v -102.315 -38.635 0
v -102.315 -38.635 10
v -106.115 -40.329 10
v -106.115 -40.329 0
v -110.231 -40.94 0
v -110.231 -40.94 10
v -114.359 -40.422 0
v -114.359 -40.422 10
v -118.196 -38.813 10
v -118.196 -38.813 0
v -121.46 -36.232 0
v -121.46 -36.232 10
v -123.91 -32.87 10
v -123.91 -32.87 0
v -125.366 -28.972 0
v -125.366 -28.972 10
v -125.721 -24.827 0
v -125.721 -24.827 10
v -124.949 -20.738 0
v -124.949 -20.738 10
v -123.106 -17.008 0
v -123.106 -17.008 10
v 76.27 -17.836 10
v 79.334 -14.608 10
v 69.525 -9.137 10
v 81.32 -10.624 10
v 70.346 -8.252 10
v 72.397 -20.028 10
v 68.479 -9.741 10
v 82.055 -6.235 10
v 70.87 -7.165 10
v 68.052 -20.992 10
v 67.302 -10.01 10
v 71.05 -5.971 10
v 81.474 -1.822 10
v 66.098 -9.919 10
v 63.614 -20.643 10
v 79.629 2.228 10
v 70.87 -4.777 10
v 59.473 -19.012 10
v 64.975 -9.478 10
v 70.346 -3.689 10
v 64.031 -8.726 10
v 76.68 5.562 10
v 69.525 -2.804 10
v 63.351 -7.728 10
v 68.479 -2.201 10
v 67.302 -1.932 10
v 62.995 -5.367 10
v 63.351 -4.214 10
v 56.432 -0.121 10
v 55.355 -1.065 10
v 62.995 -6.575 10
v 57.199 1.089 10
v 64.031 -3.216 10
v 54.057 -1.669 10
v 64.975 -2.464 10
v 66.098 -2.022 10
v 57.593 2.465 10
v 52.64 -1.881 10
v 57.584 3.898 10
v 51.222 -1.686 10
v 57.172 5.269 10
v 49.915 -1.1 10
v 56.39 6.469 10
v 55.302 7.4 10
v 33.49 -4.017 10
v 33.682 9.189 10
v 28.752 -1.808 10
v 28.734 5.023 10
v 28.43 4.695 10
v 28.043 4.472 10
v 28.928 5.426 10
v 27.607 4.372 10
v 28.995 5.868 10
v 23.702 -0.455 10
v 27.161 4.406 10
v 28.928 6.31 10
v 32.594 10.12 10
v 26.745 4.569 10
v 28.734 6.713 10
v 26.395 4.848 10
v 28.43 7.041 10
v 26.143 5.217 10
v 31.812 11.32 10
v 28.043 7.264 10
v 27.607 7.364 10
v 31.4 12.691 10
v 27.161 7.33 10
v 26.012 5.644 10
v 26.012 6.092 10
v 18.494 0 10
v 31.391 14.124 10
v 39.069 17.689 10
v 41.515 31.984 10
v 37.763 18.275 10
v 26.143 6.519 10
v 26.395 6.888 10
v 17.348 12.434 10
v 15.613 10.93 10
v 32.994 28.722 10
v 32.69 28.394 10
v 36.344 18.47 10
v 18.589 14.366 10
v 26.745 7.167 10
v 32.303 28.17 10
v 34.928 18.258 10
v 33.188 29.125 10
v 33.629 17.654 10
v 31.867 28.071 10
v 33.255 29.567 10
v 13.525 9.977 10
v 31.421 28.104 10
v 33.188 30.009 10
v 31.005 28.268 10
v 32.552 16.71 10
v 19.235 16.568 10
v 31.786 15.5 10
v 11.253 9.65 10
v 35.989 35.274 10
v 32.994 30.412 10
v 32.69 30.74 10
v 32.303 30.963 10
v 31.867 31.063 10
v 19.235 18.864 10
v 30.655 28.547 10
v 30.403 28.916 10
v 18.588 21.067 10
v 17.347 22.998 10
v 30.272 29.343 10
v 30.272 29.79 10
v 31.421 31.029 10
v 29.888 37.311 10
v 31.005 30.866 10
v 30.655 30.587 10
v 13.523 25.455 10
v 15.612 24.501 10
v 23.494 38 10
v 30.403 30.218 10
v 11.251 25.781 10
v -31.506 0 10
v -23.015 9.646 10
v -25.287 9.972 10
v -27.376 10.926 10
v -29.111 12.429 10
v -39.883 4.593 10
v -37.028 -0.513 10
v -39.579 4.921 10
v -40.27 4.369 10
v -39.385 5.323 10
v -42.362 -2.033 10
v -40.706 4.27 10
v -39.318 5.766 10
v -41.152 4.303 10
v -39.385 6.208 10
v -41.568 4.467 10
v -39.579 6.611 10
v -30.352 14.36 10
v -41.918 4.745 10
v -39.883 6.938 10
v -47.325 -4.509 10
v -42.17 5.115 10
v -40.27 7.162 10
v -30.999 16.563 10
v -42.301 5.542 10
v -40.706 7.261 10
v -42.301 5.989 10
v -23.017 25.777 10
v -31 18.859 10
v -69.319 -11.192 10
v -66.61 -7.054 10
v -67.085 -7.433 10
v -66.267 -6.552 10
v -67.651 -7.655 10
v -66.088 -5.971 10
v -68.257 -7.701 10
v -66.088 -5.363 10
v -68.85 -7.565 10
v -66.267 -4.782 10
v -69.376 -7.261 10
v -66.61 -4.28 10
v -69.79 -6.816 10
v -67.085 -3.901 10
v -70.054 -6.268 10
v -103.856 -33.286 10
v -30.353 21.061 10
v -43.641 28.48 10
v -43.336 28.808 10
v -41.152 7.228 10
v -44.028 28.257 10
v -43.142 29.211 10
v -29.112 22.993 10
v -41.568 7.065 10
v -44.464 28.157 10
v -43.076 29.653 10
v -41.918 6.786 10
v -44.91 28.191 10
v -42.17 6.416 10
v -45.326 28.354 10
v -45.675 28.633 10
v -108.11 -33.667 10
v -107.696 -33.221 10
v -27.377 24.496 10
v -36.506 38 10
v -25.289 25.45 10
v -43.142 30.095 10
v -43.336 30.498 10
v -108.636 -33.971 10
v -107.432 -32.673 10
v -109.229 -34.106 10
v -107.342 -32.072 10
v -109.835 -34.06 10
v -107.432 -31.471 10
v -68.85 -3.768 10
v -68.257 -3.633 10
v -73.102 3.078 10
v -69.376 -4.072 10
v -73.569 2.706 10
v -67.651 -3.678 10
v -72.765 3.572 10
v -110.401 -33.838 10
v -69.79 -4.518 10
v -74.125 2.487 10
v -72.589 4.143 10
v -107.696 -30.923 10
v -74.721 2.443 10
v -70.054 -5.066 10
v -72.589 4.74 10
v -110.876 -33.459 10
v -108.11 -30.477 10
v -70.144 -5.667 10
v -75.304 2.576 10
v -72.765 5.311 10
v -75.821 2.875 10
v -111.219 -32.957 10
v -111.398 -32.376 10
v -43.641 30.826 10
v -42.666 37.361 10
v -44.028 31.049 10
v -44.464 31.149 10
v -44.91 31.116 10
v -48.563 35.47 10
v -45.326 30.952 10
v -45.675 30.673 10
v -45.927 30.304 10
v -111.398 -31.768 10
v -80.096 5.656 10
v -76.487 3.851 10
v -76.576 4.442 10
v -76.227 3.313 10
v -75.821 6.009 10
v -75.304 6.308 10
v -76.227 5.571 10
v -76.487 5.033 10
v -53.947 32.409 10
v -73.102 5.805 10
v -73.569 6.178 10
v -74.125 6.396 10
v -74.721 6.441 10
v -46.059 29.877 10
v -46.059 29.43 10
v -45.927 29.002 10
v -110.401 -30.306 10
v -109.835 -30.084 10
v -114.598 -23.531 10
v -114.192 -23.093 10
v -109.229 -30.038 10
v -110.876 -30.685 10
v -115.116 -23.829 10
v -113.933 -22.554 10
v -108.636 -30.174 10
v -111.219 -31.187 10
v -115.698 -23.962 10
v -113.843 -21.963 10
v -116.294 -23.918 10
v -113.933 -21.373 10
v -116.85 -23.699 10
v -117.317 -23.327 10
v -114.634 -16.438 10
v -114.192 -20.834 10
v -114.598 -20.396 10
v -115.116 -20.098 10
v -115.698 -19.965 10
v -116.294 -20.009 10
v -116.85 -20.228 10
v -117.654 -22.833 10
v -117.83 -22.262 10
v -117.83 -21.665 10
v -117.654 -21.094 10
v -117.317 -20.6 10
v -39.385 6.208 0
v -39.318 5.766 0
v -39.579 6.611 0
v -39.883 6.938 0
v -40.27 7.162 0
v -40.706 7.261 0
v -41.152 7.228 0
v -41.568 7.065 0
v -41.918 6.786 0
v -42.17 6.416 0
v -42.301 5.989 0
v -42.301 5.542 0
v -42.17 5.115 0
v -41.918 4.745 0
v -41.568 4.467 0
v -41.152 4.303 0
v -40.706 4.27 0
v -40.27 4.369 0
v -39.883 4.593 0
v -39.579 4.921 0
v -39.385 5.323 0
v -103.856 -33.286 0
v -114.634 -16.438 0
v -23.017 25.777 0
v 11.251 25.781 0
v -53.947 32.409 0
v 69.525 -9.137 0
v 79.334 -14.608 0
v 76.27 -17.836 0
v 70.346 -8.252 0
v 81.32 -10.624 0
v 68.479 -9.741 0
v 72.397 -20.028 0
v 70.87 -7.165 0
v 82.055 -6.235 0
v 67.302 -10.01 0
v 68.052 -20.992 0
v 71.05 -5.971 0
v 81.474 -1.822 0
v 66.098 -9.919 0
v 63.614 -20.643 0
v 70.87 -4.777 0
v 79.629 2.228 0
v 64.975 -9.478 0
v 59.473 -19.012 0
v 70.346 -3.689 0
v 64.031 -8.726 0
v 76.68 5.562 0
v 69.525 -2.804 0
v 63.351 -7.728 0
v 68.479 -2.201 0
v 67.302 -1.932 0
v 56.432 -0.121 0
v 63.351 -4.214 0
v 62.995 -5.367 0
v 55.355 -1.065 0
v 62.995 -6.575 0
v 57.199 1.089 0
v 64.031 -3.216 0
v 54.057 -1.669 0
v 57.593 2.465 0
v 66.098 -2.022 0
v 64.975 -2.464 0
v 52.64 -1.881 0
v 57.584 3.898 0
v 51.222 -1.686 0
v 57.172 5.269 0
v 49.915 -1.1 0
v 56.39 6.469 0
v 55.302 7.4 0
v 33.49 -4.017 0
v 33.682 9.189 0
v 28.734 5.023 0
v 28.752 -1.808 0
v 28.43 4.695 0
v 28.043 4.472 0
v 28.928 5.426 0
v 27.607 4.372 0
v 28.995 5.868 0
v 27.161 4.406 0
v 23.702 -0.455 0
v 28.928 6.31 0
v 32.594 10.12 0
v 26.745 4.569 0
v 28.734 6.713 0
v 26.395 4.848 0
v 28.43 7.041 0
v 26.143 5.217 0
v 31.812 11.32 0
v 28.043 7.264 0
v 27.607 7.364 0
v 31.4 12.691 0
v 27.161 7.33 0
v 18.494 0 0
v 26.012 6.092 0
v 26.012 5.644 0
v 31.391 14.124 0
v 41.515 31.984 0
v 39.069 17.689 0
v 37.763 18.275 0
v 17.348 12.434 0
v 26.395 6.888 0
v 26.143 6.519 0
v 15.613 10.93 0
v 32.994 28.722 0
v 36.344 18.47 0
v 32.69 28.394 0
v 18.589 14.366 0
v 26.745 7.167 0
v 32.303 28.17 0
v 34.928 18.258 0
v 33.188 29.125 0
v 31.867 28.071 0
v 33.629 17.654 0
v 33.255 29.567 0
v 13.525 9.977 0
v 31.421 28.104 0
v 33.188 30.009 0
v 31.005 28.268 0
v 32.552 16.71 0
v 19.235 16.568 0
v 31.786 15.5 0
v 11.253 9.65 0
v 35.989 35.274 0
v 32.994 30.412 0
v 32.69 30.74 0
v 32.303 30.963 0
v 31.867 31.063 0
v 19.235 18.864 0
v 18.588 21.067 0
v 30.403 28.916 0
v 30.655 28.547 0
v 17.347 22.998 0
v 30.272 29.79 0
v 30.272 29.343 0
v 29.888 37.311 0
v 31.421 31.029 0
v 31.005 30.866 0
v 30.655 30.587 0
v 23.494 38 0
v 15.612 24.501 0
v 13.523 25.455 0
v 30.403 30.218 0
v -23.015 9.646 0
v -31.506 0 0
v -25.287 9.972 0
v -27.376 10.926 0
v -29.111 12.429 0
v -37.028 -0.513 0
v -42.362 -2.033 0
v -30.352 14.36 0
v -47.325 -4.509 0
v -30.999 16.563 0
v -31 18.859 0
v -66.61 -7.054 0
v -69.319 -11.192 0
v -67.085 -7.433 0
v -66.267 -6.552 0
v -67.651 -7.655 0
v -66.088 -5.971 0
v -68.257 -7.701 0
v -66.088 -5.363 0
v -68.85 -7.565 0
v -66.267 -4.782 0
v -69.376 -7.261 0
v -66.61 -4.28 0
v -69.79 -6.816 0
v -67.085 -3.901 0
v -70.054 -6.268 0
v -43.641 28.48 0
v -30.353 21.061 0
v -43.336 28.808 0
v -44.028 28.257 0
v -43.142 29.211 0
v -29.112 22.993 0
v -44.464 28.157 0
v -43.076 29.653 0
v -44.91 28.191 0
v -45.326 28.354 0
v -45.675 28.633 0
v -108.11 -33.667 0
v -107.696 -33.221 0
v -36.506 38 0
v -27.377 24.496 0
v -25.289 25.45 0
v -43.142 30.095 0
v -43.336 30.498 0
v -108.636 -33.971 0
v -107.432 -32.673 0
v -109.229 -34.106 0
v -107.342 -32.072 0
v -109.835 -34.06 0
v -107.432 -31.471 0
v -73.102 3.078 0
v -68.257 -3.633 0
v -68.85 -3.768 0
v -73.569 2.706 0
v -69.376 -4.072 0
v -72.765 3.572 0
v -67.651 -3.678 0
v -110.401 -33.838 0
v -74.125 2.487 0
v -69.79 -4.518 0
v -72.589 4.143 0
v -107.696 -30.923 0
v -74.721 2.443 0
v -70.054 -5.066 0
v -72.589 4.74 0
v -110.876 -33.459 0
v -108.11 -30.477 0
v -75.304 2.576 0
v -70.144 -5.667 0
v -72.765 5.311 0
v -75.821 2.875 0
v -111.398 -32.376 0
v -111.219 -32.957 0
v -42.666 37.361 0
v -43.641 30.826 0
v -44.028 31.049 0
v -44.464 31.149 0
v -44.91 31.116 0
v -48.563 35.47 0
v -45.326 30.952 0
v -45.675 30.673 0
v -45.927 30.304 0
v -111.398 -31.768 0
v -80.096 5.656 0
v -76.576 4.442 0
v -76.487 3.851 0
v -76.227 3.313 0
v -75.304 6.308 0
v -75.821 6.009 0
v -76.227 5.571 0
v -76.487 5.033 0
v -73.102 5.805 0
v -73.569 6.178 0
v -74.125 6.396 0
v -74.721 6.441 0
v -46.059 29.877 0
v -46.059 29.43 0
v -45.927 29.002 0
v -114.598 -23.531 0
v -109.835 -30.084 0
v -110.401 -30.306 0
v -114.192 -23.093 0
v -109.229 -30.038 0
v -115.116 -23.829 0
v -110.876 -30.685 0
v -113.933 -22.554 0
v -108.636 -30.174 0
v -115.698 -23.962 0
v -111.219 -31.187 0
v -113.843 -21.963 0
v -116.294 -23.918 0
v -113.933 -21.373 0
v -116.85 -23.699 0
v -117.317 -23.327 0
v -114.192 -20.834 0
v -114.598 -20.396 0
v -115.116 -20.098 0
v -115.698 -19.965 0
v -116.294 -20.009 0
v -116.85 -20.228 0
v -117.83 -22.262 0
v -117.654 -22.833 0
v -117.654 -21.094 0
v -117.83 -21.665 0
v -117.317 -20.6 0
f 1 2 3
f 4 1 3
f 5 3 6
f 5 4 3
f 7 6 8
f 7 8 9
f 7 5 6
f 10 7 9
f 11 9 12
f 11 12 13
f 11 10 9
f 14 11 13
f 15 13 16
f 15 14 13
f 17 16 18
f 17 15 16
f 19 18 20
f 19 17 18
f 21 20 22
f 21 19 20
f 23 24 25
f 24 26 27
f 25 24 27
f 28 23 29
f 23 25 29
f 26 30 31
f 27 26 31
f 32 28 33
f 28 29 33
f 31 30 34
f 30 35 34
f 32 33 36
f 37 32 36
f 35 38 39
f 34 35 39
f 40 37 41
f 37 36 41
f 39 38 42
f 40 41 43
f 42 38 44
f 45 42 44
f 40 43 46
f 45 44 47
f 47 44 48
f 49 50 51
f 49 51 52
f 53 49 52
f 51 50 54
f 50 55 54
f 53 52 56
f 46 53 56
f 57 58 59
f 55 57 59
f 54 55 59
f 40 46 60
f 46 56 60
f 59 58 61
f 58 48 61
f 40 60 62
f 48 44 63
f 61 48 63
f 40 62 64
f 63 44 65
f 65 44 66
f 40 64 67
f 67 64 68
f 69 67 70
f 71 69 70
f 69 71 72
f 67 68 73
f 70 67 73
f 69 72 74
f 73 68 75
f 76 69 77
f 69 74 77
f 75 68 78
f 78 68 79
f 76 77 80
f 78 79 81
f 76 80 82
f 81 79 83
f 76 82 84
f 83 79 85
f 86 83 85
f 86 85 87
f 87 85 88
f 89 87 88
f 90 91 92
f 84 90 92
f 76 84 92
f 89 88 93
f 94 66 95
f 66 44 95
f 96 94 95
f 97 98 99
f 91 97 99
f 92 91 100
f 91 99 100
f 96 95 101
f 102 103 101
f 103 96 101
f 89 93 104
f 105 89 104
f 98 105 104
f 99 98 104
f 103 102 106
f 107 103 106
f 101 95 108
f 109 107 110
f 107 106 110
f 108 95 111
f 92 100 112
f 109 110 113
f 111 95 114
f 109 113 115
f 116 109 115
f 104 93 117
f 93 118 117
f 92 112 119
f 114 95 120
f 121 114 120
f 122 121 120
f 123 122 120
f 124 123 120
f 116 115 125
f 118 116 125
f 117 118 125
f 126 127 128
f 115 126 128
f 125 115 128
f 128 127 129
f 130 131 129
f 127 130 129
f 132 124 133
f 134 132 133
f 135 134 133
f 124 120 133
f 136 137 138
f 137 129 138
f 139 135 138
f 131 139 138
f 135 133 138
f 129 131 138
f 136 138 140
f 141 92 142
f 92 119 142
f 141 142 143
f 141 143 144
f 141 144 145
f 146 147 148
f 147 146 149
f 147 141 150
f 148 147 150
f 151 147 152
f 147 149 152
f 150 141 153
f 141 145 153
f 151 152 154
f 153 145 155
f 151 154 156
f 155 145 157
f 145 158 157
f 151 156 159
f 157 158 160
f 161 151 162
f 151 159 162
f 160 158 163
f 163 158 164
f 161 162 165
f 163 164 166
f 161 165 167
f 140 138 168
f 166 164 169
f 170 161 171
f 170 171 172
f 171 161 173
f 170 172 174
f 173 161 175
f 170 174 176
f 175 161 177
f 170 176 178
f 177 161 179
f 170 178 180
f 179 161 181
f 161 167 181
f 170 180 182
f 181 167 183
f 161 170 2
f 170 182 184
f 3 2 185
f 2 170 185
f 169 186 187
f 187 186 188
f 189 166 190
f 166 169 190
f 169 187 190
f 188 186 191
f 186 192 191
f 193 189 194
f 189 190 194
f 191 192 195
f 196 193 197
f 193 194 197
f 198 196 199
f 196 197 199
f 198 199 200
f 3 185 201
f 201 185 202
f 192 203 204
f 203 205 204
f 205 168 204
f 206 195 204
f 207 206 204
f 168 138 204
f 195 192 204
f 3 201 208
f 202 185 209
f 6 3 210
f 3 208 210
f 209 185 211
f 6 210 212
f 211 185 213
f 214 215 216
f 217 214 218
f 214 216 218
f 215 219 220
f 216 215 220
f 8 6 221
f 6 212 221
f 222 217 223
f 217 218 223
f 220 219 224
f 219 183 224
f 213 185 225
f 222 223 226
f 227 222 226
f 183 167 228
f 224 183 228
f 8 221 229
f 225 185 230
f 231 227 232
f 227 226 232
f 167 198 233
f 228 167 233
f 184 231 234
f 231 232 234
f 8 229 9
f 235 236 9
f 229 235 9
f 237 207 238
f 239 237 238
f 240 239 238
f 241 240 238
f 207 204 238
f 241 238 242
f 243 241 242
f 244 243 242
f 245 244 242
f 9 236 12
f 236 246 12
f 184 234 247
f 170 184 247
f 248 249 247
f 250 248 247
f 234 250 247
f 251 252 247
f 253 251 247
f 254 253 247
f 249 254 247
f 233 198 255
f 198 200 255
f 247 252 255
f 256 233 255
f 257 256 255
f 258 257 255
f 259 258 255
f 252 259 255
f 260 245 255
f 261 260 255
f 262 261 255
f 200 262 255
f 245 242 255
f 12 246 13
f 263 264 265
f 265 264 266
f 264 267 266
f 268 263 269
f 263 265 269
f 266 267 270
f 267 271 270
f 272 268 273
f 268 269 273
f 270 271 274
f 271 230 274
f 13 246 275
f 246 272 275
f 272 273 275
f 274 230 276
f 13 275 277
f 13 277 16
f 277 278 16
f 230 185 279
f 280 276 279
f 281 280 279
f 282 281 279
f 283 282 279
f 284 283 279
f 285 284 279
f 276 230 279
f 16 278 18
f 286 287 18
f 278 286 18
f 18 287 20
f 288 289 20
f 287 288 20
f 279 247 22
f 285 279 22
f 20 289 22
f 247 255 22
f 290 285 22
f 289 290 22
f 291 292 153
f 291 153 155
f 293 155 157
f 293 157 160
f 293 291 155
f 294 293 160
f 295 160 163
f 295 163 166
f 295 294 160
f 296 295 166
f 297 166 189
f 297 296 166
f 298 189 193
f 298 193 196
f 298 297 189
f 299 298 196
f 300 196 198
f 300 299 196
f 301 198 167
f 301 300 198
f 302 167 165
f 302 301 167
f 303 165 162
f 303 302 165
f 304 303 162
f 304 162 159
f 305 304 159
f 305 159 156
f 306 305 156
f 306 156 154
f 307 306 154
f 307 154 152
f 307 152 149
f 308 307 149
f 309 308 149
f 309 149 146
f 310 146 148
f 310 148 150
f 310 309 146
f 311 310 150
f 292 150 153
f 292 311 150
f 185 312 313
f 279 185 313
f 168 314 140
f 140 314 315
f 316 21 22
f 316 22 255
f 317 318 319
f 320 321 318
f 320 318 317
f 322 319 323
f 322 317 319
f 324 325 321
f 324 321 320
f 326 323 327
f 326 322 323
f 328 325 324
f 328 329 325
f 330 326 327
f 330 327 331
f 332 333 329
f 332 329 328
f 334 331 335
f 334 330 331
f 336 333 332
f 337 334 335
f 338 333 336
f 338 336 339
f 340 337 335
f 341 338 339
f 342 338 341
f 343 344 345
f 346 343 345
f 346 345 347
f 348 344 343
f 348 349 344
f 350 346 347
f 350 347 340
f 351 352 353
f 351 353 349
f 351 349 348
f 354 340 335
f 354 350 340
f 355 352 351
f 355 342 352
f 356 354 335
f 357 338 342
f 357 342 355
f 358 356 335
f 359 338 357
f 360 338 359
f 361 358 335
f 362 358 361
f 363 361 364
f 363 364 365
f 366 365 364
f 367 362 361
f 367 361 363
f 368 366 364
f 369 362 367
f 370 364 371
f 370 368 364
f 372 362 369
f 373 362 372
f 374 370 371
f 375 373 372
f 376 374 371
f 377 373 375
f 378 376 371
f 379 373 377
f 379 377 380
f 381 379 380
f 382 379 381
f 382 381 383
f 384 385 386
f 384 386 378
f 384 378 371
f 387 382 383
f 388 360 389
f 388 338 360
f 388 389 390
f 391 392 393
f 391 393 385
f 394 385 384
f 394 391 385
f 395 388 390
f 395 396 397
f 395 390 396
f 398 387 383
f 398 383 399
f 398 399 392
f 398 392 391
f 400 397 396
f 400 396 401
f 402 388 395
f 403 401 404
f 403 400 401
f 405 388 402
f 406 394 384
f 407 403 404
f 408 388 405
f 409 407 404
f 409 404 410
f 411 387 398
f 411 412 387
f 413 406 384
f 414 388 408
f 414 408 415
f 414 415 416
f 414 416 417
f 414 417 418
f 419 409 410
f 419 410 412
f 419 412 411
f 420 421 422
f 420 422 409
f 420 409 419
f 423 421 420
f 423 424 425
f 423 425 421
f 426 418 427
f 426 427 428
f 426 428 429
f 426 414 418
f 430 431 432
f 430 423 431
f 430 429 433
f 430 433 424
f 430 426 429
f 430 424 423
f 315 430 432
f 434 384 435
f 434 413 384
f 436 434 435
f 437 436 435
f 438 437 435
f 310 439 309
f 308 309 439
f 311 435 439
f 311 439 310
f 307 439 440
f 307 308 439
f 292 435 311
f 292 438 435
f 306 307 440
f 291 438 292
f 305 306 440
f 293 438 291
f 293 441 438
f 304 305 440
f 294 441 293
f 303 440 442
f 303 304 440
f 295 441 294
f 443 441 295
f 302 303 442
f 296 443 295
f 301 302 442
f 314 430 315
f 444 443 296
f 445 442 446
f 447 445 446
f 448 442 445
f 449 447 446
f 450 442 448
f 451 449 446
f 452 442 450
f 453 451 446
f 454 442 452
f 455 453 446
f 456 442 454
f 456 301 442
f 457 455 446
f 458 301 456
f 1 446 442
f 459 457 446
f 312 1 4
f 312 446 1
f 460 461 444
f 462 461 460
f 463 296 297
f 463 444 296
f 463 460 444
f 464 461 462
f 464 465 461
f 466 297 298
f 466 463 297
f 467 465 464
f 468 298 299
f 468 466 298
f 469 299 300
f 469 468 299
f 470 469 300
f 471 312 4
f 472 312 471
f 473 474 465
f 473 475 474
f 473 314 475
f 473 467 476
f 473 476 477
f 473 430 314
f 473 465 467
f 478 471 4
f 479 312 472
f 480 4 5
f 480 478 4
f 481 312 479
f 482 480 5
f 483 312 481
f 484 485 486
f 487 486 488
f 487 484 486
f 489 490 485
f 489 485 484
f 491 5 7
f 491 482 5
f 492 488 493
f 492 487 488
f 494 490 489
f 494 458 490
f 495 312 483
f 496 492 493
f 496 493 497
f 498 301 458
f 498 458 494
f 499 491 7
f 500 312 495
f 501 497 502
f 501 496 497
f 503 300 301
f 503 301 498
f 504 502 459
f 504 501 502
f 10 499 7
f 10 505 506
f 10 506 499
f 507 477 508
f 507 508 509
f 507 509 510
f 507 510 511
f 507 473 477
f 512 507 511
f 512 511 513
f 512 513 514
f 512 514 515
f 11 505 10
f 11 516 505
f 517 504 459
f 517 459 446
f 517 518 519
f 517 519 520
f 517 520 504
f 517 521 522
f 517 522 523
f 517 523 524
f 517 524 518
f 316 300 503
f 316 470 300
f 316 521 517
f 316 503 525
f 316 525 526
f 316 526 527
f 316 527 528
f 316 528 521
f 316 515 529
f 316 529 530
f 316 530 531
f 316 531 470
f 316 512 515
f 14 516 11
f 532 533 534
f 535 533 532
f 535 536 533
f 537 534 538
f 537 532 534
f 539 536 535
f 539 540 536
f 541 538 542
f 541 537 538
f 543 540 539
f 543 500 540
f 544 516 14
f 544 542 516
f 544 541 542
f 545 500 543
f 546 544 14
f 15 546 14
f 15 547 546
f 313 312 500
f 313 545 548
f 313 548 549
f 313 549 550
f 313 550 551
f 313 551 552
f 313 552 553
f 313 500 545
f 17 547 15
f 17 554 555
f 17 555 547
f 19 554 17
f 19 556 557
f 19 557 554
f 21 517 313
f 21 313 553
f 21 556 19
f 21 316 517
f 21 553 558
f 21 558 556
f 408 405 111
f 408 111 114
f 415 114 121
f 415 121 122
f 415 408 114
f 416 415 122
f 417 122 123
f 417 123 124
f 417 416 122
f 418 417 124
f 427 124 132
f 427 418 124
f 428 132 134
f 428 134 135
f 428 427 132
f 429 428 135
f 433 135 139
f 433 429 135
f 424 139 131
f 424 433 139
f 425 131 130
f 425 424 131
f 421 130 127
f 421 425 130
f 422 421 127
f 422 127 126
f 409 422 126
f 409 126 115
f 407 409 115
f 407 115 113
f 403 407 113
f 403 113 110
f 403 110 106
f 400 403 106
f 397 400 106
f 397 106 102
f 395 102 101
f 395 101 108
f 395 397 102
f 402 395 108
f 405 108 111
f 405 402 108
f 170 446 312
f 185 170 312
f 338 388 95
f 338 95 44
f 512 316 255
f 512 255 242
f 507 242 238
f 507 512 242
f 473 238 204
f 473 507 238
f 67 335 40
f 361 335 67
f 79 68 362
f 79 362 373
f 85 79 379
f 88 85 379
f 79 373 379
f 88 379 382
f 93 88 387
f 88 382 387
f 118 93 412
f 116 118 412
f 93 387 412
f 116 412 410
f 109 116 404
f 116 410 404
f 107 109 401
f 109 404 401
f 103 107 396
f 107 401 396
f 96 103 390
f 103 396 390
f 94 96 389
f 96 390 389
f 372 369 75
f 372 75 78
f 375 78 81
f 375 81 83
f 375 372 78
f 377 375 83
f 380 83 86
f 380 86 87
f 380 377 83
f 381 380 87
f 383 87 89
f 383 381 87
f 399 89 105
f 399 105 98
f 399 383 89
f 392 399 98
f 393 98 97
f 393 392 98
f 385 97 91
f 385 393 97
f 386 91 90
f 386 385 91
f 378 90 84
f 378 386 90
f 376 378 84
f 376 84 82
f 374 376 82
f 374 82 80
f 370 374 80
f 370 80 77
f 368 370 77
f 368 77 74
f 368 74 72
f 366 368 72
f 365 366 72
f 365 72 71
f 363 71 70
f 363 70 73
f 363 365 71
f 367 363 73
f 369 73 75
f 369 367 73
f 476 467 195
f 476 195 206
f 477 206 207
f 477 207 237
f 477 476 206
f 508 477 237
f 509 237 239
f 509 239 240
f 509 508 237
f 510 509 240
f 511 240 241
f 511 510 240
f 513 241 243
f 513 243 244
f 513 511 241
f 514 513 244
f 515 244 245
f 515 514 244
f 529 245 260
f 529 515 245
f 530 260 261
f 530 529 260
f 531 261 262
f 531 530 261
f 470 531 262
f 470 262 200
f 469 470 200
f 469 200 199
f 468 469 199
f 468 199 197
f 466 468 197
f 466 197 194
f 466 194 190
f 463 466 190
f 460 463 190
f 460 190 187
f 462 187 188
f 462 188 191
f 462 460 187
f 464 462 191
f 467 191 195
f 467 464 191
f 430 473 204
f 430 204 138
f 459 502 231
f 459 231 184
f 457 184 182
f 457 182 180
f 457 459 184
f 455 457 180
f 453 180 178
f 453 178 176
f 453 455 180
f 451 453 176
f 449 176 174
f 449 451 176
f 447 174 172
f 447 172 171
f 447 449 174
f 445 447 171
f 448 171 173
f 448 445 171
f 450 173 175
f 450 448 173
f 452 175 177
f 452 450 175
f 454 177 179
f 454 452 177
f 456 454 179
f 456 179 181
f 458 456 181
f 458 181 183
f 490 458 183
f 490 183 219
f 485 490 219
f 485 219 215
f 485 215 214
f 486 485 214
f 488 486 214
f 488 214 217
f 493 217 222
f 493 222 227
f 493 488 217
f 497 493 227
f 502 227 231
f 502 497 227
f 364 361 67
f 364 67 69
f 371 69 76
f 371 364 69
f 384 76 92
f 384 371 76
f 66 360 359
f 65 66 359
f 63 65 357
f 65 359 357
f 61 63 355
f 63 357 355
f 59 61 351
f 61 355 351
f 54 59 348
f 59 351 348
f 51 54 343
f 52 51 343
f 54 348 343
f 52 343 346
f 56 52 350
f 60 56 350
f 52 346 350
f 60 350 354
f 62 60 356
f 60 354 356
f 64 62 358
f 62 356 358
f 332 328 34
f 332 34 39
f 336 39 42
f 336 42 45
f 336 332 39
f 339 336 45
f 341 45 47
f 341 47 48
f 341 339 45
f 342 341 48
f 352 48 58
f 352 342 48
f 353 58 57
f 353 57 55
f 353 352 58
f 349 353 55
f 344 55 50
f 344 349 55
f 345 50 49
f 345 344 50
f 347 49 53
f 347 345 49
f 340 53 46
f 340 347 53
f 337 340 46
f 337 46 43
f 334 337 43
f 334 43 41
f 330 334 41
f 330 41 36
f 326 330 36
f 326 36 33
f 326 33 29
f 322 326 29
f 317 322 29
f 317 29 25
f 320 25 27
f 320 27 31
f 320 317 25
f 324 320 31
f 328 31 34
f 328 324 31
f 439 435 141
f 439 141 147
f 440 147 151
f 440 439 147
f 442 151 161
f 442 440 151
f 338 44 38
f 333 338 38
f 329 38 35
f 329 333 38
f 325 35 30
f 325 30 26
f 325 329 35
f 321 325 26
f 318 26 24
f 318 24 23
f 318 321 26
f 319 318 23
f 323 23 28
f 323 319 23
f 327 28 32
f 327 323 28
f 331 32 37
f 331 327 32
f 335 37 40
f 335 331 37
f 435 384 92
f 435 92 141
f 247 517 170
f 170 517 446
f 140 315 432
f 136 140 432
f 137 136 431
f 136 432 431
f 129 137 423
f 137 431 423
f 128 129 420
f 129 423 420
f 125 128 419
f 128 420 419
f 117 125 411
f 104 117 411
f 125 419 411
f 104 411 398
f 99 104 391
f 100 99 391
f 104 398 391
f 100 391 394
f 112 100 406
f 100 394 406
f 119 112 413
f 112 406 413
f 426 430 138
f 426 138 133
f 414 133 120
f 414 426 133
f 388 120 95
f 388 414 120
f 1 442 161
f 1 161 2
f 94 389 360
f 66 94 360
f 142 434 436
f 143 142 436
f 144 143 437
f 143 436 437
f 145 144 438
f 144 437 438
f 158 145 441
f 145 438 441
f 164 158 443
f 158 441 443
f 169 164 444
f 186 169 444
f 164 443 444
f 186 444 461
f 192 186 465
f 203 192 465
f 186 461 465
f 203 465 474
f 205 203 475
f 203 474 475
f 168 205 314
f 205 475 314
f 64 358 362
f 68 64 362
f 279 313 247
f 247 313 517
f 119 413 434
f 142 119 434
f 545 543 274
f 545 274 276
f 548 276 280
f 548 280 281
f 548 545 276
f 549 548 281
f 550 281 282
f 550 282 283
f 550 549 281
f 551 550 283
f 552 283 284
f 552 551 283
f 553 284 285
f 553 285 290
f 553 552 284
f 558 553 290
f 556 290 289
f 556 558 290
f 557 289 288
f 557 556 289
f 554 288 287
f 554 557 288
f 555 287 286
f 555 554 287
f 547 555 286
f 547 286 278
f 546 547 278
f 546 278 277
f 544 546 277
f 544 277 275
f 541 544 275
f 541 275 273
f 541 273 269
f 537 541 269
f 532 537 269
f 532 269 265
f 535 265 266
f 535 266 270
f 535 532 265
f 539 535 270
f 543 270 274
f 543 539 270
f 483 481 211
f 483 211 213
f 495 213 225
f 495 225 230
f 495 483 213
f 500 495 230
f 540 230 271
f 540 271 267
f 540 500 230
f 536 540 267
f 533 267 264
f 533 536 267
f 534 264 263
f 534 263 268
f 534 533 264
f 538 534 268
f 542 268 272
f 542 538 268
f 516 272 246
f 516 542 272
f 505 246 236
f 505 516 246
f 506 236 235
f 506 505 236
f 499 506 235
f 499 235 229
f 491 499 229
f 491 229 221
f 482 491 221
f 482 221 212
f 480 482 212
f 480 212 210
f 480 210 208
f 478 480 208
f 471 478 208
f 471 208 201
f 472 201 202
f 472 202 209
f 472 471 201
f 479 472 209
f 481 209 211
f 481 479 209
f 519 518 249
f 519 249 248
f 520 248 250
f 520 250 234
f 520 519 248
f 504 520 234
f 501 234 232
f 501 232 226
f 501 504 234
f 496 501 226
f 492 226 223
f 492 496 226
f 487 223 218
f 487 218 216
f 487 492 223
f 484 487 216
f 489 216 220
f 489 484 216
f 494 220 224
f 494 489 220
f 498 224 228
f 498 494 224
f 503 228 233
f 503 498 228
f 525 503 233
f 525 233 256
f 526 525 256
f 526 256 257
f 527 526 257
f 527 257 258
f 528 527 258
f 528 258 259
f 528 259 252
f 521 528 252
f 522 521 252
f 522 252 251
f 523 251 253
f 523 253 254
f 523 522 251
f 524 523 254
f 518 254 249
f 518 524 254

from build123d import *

# Parameters (mm, degrees)
SKETCH1_R           = 4.05
SKETCH1_R_2         = 1.5
SKETCH1_R_3         = 2.004491684
SKETCH1_R_4         = 2.039529922
BOSS_EXTRUDE1_DEPTH = 10


with BuildPart() as part:
    # Sketch1 → Boss-Extrude1 (new body)
    with BuildSketch(Plane.XY):
        with BuildLine():
            Line((-36.50585994, 38), (23.49414006, 38))
            ThreePointArc((23.49414006, 38), (32.993428927, 36.45634395), (41.515142146, 31.984234067))
            Line((41.515142146, 31.984234067), (76.680353084, 5.562196244))
            ThreePointArc((76.680353084, 5.562196244), (79.334029485, -14.607546806), (59.473059994, -19.012365084))
            Line((59.473059994, -19.012365084), (33.489782569, -4.016722575))
            ThreePointArc((33.489782569, -4.016722575), (26.256281428, -1.021574208), (18.49414006, 0))
            Line((18.49414006, 0), (-31.50585994, 0))
            ThreePointArc((-31.50585994, 0), (-39.73032204, -1.149380887), (-47.324581503, -4.509451788))
            Line((-47.324581503, -4.509451788), (-102.315148598, -38.635060317))
            ThreePointArc((-102.315148598, -38.635060317), (-121.459805376, -36.232350563), (-123.106127076, -17.0078734))
            Line((-123.106127076, -17.0078734), (-53.947129798, 32.409057863))
            ThreePointArc((-53.947129798, 32.409057863), (-45.663596127, 36.56809178), (-36.50585994, 38))
        make_face()
        with Locations((66.99963225, -5.970908883)):
            Circle(SKETCH1_R, mode=Mode.SUBTRACT)
        with Locations((-44.575814379, 29.653127509)):
            Circle(SKETCH1_R_2, mode=Mode.SUBTRACT)
        with Locations((-115.847944697, -21.963472834)):
            Circle(SKETCH1_R_3, mode=Mode.SUBTRACT)
        with Locations((-109.381373154, -32.072055944)):
            Circle(SKETCH1_R_4, mode=Mode.SUBTRACT)
        with Locations(Location((-68.10465879, -5.666888812, 0), (0, 0, 180))):
            Circle(SKETCH1_R_4, mode=Mode.SUBTRACT)
        with Locations(Location((-74.571230332, 4.441694298, 0), (0, 0, 180))):
            Circle(SKETCH1_R_3, mode=Mode.SUBTRACT)
        with Locations((-40.818103787, 5.765583384)):
            Circle(SKETCH1_R_2, mode=Mode.SUBTRACT)
        with Locations((31.754938755, 29.566776323)):
            Circle(SKETCH1_R_2, mode=Mode.SUBTRACT)
        with Locations((27.4947716, 5.867993419)):
            Circle(SKETCH1_R_2, mode=Mode.SUBTRACT)
        Polygon((-114.633940841, -16.438421283), (-80.096281883, 5.655698153), (-69.318662645, -11.191940363), (-103.856321604, -33.286059799), align=None, mode=Mode.SUBTRACT)
        with BuildLine():
            Line((-23.016668441, 25.777290149), (11.250740888, 25.781094638))
            ThreePointArc((11.250740888, 25.781094638), (19.317386003, 17.716240499), (11.252531864, 9.649595384))
            Line((11.252531864, 9.649595384), (-23.014877464, 9.645790894))
            ThreePointArc((-23.014877464, 9.645790894), (-31.08152258, 17.710645033), (-23.016668441, 25.777290149))
        make_face(mode=Mode.SUBTRACT)
        with BuildLine():
            Line((39.069043687, 17.688629392), (55.302205937, 7.399981644))
            ThreePointArc((55.302205937, 7.399981644), (56.858473261, 0.45660111), (49.915092727, -1.099666214))
            Line((49.915092727, -1.099666214), (33.681930477, 9.188981534))
            ThreePointArc((33.681930477, 9.188981534), (32.125663153, 16.132362067), (39.069043687, 17.688629392))
        make_face(mode=Mode.SUBTRACT)
    extrude(amount=BOSS_EXTRUDE1_DEPTH)


solid = part.part
